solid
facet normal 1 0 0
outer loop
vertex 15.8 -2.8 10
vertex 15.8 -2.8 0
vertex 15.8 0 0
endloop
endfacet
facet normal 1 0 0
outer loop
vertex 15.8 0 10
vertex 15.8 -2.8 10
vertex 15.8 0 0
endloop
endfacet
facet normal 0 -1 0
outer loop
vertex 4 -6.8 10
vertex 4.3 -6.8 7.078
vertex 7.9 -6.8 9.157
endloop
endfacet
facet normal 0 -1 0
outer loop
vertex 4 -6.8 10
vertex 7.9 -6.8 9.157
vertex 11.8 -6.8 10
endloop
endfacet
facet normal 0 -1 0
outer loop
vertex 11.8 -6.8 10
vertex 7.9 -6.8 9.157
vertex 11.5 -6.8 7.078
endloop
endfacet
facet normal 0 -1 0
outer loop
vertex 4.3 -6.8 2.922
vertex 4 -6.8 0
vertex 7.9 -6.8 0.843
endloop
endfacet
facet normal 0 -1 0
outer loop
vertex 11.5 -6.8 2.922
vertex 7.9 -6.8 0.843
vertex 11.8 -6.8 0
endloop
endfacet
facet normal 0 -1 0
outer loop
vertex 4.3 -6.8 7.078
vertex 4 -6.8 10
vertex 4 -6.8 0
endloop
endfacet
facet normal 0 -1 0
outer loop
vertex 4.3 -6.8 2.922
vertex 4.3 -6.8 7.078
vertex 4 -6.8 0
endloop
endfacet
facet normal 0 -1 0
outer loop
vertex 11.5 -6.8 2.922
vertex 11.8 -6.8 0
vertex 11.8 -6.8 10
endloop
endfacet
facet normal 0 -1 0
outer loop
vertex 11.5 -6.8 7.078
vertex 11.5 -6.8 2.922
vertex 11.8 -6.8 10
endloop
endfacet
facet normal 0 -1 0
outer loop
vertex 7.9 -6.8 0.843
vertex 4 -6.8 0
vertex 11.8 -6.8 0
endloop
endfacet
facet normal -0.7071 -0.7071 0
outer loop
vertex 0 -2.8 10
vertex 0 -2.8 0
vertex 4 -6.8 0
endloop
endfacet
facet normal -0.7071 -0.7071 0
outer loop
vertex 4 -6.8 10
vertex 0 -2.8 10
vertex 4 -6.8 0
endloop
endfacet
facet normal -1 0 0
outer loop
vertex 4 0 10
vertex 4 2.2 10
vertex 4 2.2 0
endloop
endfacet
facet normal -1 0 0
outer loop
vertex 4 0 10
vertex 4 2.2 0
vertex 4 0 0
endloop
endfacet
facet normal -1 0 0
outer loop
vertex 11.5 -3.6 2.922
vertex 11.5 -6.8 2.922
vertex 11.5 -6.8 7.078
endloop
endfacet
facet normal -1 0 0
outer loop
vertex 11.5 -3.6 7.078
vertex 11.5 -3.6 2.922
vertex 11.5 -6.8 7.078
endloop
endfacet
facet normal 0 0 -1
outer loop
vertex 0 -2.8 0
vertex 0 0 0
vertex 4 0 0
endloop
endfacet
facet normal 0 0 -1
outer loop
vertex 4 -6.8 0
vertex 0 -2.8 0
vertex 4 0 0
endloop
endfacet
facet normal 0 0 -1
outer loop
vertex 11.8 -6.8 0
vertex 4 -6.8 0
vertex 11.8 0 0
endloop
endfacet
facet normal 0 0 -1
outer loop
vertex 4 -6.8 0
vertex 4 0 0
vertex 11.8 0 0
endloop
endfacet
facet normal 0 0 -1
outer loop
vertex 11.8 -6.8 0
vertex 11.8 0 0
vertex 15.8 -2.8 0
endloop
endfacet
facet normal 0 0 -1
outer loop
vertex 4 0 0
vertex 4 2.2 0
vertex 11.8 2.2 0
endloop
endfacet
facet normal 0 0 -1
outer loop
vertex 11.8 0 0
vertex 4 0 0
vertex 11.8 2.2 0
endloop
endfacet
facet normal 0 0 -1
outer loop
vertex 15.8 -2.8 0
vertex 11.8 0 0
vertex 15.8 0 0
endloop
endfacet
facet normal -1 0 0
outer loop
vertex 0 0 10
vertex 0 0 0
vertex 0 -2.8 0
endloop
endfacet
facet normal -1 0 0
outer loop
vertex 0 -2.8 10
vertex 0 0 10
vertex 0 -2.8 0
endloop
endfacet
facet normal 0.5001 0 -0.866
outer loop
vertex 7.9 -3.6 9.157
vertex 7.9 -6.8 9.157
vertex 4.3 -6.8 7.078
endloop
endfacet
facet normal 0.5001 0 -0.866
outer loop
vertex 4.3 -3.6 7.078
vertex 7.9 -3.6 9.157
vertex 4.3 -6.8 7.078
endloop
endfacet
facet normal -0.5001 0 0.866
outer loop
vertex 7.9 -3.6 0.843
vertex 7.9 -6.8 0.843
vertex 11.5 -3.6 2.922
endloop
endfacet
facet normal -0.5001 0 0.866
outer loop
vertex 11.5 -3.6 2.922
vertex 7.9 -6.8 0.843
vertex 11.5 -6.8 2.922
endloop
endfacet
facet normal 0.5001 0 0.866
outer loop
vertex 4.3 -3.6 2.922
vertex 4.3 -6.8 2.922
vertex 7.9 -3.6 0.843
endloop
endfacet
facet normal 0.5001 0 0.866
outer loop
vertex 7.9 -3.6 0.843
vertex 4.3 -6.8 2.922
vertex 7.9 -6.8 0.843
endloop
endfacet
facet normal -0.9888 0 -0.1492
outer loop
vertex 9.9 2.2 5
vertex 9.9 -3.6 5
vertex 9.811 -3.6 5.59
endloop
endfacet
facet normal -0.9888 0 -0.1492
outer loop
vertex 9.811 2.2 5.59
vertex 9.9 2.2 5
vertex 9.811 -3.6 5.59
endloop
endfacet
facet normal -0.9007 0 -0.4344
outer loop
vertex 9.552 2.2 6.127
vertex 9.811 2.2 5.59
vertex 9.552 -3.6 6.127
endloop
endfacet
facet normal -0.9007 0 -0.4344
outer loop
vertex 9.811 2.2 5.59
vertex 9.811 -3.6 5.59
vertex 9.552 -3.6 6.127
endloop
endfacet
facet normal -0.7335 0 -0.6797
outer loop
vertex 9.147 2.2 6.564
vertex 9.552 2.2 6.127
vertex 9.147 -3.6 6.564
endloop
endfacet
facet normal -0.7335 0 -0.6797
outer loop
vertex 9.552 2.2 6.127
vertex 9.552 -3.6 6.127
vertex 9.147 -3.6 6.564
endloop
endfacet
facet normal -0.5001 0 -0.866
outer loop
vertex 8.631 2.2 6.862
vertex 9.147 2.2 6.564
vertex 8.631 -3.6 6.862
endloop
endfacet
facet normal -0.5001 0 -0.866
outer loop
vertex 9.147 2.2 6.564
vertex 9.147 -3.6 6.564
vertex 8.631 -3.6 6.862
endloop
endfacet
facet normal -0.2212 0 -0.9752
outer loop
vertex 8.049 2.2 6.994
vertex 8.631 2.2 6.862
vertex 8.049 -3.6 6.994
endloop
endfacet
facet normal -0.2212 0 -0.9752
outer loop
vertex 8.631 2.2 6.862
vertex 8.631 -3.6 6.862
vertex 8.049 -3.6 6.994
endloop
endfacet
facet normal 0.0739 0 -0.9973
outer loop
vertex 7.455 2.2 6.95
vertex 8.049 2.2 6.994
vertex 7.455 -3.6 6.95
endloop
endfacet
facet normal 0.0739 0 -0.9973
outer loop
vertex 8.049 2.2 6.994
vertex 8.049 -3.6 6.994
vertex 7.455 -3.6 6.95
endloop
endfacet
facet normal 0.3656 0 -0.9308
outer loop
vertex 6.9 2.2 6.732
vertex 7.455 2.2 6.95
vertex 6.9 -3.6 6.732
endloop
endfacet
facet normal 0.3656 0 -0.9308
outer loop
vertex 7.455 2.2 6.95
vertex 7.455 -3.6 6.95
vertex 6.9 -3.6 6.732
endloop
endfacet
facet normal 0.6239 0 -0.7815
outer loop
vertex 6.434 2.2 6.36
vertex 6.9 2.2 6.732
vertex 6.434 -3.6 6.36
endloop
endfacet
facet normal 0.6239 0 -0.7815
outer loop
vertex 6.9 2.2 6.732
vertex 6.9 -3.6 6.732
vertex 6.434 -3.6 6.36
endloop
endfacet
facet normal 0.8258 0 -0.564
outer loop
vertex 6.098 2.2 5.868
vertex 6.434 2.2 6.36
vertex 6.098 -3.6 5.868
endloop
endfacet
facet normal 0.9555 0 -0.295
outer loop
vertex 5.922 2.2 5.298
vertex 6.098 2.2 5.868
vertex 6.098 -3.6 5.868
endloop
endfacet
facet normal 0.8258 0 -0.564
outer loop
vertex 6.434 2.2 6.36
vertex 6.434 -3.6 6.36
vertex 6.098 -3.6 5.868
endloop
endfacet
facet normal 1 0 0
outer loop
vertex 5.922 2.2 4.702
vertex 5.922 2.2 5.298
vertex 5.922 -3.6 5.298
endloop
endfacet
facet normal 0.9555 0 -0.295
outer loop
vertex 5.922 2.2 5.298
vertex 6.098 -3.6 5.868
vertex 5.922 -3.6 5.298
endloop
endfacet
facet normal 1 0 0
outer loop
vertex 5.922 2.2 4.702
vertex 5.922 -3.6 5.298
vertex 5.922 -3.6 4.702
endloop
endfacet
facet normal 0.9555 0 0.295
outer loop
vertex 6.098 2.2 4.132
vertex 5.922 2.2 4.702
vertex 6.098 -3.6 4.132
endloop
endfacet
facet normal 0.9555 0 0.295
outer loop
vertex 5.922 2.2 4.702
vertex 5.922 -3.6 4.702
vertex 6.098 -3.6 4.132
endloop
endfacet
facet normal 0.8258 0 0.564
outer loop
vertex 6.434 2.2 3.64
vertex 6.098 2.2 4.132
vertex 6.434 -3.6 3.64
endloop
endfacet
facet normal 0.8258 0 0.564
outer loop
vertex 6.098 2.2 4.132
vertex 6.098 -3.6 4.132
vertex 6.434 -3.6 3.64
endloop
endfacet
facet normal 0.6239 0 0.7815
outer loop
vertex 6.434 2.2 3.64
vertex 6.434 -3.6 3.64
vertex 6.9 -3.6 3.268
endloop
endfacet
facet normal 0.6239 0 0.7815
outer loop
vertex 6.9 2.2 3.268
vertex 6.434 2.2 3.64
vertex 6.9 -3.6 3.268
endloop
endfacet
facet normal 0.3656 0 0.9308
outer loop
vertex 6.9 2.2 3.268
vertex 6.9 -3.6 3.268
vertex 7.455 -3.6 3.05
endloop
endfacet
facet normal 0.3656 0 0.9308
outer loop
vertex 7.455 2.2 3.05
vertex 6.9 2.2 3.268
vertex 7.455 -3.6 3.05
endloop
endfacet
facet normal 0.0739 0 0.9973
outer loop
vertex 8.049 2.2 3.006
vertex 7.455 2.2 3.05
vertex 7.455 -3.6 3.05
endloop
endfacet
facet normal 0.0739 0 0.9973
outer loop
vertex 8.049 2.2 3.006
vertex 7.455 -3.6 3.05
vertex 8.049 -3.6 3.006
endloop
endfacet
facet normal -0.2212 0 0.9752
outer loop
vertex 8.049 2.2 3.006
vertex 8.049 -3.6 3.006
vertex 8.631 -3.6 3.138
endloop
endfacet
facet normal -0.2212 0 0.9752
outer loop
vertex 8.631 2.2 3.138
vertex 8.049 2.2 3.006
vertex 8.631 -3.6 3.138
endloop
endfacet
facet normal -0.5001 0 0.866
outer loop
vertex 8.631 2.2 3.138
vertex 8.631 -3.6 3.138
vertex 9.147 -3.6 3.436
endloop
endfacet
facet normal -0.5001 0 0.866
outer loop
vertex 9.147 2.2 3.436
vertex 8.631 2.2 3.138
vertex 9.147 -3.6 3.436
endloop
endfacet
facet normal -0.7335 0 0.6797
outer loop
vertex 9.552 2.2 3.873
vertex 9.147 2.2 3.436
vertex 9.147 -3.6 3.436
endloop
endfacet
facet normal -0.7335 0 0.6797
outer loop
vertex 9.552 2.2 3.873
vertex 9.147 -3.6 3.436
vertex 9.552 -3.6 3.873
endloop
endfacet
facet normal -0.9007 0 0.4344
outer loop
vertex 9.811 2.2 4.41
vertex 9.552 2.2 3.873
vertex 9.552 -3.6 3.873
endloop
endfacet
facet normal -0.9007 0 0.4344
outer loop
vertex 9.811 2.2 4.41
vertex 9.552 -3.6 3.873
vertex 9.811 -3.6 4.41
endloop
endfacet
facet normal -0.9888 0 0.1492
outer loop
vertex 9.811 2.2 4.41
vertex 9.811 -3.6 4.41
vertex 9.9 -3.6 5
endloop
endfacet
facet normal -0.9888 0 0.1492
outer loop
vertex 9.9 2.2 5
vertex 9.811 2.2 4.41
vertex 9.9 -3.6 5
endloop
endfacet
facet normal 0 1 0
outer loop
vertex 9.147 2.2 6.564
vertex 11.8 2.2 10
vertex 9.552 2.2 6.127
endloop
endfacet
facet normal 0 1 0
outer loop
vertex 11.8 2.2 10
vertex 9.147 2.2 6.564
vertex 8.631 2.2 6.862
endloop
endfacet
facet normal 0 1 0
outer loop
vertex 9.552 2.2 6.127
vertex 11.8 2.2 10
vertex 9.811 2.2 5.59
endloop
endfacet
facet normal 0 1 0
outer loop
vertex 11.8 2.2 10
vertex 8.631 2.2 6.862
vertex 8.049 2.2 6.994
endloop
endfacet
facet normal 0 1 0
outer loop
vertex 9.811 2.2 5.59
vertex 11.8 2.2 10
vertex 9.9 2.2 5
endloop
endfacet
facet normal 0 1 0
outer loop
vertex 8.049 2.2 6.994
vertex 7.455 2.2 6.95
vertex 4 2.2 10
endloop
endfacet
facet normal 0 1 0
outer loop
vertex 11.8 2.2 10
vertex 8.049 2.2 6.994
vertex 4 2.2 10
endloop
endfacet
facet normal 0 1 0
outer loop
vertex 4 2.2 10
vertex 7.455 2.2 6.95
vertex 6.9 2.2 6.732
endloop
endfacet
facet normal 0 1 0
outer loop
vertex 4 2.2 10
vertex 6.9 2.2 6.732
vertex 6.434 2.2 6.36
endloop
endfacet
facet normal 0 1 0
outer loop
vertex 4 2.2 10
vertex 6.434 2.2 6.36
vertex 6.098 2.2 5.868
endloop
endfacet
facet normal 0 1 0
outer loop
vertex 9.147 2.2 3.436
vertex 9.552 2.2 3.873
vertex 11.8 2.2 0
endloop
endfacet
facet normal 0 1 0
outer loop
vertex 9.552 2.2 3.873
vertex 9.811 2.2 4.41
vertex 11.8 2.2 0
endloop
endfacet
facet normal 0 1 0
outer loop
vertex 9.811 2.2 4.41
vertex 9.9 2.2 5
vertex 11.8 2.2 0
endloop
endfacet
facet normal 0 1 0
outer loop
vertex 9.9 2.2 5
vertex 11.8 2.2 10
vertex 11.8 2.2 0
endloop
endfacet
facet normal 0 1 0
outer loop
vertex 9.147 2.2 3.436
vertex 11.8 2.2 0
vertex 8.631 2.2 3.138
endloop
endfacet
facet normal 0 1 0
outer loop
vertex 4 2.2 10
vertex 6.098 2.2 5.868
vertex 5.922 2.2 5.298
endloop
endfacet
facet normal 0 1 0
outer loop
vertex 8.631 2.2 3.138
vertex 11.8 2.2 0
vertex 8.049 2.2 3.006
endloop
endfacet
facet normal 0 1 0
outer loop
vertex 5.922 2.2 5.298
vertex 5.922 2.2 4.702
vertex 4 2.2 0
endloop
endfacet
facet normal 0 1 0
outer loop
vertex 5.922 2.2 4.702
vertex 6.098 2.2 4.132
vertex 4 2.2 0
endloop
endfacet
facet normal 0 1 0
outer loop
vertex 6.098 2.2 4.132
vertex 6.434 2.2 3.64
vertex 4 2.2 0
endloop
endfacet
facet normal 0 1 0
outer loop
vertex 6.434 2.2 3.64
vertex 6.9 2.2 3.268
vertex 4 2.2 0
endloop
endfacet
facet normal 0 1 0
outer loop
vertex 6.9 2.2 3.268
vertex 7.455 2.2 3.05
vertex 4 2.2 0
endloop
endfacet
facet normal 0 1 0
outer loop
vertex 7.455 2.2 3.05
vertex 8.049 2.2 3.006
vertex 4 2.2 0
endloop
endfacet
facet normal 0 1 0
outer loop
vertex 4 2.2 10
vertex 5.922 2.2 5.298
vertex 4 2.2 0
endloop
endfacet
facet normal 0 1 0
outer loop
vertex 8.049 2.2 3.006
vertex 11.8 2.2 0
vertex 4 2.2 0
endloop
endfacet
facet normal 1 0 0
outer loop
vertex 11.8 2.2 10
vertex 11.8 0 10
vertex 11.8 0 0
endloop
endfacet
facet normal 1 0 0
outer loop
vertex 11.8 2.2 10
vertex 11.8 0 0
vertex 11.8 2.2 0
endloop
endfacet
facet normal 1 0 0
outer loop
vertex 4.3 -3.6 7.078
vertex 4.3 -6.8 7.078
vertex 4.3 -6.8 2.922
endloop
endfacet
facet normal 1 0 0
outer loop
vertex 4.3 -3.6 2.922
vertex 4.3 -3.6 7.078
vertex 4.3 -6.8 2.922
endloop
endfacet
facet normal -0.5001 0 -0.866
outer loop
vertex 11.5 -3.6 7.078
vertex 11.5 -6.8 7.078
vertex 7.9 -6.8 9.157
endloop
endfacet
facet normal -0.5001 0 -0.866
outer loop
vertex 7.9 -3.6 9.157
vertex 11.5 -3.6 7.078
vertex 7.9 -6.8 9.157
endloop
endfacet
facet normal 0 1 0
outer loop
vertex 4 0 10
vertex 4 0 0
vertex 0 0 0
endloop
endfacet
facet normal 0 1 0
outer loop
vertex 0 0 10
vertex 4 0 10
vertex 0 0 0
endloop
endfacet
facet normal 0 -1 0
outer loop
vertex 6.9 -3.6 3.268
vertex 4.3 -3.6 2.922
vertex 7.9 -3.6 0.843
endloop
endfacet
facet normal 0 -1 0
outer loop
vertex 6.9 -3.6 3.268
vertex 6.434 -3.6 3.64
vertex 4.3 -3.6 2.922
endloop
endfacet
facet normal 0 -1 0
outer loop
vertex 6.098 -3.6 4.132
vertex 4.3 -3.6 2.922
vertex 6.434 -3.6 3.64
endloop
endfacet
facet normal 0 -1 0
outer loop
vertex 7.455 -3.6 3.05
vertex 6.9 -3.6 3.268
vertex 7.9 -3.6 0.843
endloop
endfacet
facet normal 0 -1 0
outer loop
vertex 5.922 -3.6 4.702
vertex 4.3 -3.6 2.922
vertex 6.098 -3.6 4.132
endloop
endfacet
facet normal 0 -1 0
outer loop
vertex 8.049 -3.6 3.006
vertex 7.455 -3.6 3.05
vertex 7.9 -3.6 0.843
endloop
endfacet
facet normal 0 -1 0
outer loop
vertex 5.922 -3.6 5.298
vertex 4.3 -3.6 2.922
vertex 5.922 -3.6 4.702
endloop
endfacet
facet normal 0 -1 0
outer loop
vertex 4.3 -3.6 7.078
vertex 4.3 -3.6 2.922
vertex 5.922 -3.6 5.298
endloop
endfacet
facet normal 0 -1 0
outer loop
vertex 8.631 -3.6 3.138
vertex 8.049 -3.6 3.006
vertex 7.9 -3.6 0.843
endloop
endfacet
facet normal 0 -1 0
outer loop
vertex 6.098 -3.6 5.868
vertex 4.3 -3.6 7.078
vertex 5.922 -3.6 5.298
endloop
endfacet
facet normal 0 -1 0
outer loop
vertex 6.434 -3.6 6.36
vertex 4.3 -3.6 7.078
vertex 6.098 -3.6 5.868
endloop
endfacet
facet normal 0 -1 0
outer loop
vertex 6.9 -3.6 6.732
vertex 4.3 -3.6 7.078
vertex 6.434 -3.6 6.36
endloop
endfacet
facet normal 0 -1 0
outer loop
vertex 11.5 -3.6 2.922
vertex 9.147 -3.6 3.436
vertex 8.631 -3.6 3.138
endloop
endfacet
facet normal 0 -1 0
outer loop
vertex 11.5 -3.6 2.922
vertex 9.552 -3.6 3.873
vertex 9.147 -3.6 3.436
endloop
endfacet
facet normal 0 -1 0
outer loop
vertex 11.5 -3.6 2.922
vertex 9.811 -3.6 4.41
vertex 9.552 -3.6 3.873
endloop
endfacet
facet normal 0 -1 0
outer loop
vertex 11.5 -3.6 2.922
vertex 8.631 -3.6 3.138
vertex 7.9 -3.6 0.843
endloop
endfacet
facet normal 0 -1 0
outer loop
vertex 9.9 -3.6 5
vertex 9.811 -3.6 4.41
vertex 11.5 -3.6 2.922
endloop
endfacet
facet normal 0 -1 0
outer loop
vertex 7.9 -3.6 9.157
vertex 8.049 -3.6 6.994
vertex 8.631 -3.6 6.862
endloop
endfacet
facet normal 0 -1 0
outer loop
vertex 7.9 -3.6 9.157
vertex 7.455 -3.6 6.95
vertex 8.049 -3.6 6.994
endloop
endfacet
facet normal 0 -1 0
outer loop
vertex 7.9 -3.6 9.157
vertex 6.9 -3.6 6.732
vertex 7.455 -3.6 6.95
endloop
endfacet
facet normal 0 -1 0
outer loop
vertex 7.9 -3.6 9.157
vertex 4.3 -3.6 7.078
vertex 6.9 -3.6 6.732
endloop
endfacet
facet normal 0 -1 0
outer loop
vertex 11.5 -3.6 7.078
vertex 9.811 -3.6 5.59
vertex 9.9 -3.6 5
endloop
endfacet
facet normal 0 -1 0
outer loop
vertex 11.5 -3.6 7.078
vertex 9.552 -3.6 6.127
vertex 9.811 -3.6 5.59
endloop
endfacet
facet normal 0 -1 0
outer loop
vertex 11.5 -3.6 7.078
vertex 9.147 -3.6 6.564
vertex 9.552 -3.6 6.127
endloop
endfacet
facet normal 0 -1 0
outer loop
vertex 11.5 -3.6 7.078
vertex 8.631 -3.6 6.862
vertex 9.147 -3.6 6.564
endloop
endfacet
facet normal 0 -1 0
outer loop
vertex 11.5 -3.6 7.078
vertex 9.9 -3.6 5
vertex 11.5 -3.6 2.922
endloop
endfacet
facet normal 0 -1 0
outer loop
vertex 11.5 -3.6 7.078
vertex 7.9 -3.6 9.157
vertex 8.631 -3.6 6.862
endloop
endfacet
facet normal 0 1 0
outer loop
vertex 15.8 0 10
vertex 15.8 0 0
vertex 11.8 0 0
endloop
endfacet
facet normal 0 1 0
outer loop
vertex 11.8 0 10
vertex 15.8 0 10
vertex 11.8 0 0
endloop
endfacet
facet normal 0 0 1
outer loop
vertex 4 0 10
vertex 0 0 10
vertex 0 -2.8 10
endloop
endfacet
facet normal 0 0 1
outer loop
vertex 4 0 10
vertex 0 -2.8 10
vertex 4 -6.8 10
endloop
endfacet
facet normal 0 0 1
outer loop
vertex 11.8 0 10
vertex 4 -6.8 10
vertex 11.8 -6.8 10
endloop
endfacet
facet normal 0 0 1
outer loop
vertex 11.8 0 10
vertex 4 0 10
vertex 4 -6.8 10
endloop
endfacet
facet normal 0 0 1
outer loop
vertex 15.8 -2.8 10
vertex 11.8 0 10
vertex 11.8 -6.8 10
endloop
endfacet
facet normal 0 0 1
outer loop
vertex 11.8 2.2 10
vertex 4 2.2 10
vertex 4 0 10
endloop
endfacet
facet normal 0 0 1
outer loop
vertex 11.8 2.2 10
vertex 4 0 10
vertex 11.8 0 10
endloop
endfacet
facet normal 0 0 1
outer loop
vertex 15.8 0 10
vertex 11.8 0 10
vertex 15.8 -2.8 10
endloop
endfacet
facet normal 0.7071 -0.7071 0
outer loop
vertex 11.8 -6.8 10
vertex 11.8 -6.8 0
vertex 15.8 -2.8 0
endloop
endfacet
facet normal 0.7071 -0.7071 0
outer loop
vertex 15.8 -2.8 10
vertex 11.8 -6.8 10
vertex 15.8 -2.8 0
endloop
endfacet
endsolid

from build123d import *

# Parameters (mm, degrees)
PAD_DEPTH       = 10
POCKET_DEPTH    = 3.2
SKETCH002_R     = 2
POCKET001_DEPTH = 9.001


with BuildPart() as part:
    # Sketch → Pad (new body)
    with BuildSketch(Plane.XY):
        Polygon((0, 0), (0, -2.8), (4, -6.8), (11.8, -6.8), (15.8, -2.8), (15.8, 0), (11.8, 0), (11.8, 2.2), (4, 2.2), (4, 0), align=None)
    extrude(amount=PAD_DEPTH)

    # Sketch001 (on DatumPlane) → Pocket (cut)
    with BuildSketch(Plane.XZ.offset(6.8)):
        Polygon((11.5, 7.078461), (7.9, 9.156922), (4.3, 7.078461), (4.3, 2.921539), (7.9, 0.843078), (11.5, 2.921539), align=None)
    extrude(amount=-POCKET_DEPTH, mode=Mode.SUBTRACT)

    # Sketch002 (on DatumPlane) → Pocket001 (cut, through all)
    with BuildSketch(Plane.XZ.offset(6.8)):
        with Locations((7.9, 5)):
            Circle(SKETCH002_R)
    extrude(amount=-POCKET001_DEPTH, mode=Mode.SUBTRACT)


solid = part.part
